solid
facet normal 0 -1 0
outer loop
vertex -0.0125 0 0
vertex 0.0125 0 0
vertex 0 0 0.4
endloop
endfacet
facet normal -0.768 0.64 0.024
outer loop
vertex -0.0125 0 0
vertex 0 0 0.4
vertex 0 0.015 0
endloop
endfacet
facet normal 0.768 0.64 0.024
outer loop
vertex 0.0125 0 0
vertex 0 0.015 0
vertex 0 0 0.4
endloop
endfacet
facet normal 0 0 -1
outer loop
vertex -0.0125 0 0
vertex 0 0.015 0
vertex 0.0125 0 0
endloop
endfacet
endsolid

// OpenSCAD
polyhedron(
    points = [[-0.0125, 0, 0], [0, 0.015, 0], [0.0125, 0, 0], [0, 0, 0.4]],
    faces = [[3, 2, 0], [1, 3, 0], [3, 1, 2], [2, 1, 0]],
    convexity = 10);
